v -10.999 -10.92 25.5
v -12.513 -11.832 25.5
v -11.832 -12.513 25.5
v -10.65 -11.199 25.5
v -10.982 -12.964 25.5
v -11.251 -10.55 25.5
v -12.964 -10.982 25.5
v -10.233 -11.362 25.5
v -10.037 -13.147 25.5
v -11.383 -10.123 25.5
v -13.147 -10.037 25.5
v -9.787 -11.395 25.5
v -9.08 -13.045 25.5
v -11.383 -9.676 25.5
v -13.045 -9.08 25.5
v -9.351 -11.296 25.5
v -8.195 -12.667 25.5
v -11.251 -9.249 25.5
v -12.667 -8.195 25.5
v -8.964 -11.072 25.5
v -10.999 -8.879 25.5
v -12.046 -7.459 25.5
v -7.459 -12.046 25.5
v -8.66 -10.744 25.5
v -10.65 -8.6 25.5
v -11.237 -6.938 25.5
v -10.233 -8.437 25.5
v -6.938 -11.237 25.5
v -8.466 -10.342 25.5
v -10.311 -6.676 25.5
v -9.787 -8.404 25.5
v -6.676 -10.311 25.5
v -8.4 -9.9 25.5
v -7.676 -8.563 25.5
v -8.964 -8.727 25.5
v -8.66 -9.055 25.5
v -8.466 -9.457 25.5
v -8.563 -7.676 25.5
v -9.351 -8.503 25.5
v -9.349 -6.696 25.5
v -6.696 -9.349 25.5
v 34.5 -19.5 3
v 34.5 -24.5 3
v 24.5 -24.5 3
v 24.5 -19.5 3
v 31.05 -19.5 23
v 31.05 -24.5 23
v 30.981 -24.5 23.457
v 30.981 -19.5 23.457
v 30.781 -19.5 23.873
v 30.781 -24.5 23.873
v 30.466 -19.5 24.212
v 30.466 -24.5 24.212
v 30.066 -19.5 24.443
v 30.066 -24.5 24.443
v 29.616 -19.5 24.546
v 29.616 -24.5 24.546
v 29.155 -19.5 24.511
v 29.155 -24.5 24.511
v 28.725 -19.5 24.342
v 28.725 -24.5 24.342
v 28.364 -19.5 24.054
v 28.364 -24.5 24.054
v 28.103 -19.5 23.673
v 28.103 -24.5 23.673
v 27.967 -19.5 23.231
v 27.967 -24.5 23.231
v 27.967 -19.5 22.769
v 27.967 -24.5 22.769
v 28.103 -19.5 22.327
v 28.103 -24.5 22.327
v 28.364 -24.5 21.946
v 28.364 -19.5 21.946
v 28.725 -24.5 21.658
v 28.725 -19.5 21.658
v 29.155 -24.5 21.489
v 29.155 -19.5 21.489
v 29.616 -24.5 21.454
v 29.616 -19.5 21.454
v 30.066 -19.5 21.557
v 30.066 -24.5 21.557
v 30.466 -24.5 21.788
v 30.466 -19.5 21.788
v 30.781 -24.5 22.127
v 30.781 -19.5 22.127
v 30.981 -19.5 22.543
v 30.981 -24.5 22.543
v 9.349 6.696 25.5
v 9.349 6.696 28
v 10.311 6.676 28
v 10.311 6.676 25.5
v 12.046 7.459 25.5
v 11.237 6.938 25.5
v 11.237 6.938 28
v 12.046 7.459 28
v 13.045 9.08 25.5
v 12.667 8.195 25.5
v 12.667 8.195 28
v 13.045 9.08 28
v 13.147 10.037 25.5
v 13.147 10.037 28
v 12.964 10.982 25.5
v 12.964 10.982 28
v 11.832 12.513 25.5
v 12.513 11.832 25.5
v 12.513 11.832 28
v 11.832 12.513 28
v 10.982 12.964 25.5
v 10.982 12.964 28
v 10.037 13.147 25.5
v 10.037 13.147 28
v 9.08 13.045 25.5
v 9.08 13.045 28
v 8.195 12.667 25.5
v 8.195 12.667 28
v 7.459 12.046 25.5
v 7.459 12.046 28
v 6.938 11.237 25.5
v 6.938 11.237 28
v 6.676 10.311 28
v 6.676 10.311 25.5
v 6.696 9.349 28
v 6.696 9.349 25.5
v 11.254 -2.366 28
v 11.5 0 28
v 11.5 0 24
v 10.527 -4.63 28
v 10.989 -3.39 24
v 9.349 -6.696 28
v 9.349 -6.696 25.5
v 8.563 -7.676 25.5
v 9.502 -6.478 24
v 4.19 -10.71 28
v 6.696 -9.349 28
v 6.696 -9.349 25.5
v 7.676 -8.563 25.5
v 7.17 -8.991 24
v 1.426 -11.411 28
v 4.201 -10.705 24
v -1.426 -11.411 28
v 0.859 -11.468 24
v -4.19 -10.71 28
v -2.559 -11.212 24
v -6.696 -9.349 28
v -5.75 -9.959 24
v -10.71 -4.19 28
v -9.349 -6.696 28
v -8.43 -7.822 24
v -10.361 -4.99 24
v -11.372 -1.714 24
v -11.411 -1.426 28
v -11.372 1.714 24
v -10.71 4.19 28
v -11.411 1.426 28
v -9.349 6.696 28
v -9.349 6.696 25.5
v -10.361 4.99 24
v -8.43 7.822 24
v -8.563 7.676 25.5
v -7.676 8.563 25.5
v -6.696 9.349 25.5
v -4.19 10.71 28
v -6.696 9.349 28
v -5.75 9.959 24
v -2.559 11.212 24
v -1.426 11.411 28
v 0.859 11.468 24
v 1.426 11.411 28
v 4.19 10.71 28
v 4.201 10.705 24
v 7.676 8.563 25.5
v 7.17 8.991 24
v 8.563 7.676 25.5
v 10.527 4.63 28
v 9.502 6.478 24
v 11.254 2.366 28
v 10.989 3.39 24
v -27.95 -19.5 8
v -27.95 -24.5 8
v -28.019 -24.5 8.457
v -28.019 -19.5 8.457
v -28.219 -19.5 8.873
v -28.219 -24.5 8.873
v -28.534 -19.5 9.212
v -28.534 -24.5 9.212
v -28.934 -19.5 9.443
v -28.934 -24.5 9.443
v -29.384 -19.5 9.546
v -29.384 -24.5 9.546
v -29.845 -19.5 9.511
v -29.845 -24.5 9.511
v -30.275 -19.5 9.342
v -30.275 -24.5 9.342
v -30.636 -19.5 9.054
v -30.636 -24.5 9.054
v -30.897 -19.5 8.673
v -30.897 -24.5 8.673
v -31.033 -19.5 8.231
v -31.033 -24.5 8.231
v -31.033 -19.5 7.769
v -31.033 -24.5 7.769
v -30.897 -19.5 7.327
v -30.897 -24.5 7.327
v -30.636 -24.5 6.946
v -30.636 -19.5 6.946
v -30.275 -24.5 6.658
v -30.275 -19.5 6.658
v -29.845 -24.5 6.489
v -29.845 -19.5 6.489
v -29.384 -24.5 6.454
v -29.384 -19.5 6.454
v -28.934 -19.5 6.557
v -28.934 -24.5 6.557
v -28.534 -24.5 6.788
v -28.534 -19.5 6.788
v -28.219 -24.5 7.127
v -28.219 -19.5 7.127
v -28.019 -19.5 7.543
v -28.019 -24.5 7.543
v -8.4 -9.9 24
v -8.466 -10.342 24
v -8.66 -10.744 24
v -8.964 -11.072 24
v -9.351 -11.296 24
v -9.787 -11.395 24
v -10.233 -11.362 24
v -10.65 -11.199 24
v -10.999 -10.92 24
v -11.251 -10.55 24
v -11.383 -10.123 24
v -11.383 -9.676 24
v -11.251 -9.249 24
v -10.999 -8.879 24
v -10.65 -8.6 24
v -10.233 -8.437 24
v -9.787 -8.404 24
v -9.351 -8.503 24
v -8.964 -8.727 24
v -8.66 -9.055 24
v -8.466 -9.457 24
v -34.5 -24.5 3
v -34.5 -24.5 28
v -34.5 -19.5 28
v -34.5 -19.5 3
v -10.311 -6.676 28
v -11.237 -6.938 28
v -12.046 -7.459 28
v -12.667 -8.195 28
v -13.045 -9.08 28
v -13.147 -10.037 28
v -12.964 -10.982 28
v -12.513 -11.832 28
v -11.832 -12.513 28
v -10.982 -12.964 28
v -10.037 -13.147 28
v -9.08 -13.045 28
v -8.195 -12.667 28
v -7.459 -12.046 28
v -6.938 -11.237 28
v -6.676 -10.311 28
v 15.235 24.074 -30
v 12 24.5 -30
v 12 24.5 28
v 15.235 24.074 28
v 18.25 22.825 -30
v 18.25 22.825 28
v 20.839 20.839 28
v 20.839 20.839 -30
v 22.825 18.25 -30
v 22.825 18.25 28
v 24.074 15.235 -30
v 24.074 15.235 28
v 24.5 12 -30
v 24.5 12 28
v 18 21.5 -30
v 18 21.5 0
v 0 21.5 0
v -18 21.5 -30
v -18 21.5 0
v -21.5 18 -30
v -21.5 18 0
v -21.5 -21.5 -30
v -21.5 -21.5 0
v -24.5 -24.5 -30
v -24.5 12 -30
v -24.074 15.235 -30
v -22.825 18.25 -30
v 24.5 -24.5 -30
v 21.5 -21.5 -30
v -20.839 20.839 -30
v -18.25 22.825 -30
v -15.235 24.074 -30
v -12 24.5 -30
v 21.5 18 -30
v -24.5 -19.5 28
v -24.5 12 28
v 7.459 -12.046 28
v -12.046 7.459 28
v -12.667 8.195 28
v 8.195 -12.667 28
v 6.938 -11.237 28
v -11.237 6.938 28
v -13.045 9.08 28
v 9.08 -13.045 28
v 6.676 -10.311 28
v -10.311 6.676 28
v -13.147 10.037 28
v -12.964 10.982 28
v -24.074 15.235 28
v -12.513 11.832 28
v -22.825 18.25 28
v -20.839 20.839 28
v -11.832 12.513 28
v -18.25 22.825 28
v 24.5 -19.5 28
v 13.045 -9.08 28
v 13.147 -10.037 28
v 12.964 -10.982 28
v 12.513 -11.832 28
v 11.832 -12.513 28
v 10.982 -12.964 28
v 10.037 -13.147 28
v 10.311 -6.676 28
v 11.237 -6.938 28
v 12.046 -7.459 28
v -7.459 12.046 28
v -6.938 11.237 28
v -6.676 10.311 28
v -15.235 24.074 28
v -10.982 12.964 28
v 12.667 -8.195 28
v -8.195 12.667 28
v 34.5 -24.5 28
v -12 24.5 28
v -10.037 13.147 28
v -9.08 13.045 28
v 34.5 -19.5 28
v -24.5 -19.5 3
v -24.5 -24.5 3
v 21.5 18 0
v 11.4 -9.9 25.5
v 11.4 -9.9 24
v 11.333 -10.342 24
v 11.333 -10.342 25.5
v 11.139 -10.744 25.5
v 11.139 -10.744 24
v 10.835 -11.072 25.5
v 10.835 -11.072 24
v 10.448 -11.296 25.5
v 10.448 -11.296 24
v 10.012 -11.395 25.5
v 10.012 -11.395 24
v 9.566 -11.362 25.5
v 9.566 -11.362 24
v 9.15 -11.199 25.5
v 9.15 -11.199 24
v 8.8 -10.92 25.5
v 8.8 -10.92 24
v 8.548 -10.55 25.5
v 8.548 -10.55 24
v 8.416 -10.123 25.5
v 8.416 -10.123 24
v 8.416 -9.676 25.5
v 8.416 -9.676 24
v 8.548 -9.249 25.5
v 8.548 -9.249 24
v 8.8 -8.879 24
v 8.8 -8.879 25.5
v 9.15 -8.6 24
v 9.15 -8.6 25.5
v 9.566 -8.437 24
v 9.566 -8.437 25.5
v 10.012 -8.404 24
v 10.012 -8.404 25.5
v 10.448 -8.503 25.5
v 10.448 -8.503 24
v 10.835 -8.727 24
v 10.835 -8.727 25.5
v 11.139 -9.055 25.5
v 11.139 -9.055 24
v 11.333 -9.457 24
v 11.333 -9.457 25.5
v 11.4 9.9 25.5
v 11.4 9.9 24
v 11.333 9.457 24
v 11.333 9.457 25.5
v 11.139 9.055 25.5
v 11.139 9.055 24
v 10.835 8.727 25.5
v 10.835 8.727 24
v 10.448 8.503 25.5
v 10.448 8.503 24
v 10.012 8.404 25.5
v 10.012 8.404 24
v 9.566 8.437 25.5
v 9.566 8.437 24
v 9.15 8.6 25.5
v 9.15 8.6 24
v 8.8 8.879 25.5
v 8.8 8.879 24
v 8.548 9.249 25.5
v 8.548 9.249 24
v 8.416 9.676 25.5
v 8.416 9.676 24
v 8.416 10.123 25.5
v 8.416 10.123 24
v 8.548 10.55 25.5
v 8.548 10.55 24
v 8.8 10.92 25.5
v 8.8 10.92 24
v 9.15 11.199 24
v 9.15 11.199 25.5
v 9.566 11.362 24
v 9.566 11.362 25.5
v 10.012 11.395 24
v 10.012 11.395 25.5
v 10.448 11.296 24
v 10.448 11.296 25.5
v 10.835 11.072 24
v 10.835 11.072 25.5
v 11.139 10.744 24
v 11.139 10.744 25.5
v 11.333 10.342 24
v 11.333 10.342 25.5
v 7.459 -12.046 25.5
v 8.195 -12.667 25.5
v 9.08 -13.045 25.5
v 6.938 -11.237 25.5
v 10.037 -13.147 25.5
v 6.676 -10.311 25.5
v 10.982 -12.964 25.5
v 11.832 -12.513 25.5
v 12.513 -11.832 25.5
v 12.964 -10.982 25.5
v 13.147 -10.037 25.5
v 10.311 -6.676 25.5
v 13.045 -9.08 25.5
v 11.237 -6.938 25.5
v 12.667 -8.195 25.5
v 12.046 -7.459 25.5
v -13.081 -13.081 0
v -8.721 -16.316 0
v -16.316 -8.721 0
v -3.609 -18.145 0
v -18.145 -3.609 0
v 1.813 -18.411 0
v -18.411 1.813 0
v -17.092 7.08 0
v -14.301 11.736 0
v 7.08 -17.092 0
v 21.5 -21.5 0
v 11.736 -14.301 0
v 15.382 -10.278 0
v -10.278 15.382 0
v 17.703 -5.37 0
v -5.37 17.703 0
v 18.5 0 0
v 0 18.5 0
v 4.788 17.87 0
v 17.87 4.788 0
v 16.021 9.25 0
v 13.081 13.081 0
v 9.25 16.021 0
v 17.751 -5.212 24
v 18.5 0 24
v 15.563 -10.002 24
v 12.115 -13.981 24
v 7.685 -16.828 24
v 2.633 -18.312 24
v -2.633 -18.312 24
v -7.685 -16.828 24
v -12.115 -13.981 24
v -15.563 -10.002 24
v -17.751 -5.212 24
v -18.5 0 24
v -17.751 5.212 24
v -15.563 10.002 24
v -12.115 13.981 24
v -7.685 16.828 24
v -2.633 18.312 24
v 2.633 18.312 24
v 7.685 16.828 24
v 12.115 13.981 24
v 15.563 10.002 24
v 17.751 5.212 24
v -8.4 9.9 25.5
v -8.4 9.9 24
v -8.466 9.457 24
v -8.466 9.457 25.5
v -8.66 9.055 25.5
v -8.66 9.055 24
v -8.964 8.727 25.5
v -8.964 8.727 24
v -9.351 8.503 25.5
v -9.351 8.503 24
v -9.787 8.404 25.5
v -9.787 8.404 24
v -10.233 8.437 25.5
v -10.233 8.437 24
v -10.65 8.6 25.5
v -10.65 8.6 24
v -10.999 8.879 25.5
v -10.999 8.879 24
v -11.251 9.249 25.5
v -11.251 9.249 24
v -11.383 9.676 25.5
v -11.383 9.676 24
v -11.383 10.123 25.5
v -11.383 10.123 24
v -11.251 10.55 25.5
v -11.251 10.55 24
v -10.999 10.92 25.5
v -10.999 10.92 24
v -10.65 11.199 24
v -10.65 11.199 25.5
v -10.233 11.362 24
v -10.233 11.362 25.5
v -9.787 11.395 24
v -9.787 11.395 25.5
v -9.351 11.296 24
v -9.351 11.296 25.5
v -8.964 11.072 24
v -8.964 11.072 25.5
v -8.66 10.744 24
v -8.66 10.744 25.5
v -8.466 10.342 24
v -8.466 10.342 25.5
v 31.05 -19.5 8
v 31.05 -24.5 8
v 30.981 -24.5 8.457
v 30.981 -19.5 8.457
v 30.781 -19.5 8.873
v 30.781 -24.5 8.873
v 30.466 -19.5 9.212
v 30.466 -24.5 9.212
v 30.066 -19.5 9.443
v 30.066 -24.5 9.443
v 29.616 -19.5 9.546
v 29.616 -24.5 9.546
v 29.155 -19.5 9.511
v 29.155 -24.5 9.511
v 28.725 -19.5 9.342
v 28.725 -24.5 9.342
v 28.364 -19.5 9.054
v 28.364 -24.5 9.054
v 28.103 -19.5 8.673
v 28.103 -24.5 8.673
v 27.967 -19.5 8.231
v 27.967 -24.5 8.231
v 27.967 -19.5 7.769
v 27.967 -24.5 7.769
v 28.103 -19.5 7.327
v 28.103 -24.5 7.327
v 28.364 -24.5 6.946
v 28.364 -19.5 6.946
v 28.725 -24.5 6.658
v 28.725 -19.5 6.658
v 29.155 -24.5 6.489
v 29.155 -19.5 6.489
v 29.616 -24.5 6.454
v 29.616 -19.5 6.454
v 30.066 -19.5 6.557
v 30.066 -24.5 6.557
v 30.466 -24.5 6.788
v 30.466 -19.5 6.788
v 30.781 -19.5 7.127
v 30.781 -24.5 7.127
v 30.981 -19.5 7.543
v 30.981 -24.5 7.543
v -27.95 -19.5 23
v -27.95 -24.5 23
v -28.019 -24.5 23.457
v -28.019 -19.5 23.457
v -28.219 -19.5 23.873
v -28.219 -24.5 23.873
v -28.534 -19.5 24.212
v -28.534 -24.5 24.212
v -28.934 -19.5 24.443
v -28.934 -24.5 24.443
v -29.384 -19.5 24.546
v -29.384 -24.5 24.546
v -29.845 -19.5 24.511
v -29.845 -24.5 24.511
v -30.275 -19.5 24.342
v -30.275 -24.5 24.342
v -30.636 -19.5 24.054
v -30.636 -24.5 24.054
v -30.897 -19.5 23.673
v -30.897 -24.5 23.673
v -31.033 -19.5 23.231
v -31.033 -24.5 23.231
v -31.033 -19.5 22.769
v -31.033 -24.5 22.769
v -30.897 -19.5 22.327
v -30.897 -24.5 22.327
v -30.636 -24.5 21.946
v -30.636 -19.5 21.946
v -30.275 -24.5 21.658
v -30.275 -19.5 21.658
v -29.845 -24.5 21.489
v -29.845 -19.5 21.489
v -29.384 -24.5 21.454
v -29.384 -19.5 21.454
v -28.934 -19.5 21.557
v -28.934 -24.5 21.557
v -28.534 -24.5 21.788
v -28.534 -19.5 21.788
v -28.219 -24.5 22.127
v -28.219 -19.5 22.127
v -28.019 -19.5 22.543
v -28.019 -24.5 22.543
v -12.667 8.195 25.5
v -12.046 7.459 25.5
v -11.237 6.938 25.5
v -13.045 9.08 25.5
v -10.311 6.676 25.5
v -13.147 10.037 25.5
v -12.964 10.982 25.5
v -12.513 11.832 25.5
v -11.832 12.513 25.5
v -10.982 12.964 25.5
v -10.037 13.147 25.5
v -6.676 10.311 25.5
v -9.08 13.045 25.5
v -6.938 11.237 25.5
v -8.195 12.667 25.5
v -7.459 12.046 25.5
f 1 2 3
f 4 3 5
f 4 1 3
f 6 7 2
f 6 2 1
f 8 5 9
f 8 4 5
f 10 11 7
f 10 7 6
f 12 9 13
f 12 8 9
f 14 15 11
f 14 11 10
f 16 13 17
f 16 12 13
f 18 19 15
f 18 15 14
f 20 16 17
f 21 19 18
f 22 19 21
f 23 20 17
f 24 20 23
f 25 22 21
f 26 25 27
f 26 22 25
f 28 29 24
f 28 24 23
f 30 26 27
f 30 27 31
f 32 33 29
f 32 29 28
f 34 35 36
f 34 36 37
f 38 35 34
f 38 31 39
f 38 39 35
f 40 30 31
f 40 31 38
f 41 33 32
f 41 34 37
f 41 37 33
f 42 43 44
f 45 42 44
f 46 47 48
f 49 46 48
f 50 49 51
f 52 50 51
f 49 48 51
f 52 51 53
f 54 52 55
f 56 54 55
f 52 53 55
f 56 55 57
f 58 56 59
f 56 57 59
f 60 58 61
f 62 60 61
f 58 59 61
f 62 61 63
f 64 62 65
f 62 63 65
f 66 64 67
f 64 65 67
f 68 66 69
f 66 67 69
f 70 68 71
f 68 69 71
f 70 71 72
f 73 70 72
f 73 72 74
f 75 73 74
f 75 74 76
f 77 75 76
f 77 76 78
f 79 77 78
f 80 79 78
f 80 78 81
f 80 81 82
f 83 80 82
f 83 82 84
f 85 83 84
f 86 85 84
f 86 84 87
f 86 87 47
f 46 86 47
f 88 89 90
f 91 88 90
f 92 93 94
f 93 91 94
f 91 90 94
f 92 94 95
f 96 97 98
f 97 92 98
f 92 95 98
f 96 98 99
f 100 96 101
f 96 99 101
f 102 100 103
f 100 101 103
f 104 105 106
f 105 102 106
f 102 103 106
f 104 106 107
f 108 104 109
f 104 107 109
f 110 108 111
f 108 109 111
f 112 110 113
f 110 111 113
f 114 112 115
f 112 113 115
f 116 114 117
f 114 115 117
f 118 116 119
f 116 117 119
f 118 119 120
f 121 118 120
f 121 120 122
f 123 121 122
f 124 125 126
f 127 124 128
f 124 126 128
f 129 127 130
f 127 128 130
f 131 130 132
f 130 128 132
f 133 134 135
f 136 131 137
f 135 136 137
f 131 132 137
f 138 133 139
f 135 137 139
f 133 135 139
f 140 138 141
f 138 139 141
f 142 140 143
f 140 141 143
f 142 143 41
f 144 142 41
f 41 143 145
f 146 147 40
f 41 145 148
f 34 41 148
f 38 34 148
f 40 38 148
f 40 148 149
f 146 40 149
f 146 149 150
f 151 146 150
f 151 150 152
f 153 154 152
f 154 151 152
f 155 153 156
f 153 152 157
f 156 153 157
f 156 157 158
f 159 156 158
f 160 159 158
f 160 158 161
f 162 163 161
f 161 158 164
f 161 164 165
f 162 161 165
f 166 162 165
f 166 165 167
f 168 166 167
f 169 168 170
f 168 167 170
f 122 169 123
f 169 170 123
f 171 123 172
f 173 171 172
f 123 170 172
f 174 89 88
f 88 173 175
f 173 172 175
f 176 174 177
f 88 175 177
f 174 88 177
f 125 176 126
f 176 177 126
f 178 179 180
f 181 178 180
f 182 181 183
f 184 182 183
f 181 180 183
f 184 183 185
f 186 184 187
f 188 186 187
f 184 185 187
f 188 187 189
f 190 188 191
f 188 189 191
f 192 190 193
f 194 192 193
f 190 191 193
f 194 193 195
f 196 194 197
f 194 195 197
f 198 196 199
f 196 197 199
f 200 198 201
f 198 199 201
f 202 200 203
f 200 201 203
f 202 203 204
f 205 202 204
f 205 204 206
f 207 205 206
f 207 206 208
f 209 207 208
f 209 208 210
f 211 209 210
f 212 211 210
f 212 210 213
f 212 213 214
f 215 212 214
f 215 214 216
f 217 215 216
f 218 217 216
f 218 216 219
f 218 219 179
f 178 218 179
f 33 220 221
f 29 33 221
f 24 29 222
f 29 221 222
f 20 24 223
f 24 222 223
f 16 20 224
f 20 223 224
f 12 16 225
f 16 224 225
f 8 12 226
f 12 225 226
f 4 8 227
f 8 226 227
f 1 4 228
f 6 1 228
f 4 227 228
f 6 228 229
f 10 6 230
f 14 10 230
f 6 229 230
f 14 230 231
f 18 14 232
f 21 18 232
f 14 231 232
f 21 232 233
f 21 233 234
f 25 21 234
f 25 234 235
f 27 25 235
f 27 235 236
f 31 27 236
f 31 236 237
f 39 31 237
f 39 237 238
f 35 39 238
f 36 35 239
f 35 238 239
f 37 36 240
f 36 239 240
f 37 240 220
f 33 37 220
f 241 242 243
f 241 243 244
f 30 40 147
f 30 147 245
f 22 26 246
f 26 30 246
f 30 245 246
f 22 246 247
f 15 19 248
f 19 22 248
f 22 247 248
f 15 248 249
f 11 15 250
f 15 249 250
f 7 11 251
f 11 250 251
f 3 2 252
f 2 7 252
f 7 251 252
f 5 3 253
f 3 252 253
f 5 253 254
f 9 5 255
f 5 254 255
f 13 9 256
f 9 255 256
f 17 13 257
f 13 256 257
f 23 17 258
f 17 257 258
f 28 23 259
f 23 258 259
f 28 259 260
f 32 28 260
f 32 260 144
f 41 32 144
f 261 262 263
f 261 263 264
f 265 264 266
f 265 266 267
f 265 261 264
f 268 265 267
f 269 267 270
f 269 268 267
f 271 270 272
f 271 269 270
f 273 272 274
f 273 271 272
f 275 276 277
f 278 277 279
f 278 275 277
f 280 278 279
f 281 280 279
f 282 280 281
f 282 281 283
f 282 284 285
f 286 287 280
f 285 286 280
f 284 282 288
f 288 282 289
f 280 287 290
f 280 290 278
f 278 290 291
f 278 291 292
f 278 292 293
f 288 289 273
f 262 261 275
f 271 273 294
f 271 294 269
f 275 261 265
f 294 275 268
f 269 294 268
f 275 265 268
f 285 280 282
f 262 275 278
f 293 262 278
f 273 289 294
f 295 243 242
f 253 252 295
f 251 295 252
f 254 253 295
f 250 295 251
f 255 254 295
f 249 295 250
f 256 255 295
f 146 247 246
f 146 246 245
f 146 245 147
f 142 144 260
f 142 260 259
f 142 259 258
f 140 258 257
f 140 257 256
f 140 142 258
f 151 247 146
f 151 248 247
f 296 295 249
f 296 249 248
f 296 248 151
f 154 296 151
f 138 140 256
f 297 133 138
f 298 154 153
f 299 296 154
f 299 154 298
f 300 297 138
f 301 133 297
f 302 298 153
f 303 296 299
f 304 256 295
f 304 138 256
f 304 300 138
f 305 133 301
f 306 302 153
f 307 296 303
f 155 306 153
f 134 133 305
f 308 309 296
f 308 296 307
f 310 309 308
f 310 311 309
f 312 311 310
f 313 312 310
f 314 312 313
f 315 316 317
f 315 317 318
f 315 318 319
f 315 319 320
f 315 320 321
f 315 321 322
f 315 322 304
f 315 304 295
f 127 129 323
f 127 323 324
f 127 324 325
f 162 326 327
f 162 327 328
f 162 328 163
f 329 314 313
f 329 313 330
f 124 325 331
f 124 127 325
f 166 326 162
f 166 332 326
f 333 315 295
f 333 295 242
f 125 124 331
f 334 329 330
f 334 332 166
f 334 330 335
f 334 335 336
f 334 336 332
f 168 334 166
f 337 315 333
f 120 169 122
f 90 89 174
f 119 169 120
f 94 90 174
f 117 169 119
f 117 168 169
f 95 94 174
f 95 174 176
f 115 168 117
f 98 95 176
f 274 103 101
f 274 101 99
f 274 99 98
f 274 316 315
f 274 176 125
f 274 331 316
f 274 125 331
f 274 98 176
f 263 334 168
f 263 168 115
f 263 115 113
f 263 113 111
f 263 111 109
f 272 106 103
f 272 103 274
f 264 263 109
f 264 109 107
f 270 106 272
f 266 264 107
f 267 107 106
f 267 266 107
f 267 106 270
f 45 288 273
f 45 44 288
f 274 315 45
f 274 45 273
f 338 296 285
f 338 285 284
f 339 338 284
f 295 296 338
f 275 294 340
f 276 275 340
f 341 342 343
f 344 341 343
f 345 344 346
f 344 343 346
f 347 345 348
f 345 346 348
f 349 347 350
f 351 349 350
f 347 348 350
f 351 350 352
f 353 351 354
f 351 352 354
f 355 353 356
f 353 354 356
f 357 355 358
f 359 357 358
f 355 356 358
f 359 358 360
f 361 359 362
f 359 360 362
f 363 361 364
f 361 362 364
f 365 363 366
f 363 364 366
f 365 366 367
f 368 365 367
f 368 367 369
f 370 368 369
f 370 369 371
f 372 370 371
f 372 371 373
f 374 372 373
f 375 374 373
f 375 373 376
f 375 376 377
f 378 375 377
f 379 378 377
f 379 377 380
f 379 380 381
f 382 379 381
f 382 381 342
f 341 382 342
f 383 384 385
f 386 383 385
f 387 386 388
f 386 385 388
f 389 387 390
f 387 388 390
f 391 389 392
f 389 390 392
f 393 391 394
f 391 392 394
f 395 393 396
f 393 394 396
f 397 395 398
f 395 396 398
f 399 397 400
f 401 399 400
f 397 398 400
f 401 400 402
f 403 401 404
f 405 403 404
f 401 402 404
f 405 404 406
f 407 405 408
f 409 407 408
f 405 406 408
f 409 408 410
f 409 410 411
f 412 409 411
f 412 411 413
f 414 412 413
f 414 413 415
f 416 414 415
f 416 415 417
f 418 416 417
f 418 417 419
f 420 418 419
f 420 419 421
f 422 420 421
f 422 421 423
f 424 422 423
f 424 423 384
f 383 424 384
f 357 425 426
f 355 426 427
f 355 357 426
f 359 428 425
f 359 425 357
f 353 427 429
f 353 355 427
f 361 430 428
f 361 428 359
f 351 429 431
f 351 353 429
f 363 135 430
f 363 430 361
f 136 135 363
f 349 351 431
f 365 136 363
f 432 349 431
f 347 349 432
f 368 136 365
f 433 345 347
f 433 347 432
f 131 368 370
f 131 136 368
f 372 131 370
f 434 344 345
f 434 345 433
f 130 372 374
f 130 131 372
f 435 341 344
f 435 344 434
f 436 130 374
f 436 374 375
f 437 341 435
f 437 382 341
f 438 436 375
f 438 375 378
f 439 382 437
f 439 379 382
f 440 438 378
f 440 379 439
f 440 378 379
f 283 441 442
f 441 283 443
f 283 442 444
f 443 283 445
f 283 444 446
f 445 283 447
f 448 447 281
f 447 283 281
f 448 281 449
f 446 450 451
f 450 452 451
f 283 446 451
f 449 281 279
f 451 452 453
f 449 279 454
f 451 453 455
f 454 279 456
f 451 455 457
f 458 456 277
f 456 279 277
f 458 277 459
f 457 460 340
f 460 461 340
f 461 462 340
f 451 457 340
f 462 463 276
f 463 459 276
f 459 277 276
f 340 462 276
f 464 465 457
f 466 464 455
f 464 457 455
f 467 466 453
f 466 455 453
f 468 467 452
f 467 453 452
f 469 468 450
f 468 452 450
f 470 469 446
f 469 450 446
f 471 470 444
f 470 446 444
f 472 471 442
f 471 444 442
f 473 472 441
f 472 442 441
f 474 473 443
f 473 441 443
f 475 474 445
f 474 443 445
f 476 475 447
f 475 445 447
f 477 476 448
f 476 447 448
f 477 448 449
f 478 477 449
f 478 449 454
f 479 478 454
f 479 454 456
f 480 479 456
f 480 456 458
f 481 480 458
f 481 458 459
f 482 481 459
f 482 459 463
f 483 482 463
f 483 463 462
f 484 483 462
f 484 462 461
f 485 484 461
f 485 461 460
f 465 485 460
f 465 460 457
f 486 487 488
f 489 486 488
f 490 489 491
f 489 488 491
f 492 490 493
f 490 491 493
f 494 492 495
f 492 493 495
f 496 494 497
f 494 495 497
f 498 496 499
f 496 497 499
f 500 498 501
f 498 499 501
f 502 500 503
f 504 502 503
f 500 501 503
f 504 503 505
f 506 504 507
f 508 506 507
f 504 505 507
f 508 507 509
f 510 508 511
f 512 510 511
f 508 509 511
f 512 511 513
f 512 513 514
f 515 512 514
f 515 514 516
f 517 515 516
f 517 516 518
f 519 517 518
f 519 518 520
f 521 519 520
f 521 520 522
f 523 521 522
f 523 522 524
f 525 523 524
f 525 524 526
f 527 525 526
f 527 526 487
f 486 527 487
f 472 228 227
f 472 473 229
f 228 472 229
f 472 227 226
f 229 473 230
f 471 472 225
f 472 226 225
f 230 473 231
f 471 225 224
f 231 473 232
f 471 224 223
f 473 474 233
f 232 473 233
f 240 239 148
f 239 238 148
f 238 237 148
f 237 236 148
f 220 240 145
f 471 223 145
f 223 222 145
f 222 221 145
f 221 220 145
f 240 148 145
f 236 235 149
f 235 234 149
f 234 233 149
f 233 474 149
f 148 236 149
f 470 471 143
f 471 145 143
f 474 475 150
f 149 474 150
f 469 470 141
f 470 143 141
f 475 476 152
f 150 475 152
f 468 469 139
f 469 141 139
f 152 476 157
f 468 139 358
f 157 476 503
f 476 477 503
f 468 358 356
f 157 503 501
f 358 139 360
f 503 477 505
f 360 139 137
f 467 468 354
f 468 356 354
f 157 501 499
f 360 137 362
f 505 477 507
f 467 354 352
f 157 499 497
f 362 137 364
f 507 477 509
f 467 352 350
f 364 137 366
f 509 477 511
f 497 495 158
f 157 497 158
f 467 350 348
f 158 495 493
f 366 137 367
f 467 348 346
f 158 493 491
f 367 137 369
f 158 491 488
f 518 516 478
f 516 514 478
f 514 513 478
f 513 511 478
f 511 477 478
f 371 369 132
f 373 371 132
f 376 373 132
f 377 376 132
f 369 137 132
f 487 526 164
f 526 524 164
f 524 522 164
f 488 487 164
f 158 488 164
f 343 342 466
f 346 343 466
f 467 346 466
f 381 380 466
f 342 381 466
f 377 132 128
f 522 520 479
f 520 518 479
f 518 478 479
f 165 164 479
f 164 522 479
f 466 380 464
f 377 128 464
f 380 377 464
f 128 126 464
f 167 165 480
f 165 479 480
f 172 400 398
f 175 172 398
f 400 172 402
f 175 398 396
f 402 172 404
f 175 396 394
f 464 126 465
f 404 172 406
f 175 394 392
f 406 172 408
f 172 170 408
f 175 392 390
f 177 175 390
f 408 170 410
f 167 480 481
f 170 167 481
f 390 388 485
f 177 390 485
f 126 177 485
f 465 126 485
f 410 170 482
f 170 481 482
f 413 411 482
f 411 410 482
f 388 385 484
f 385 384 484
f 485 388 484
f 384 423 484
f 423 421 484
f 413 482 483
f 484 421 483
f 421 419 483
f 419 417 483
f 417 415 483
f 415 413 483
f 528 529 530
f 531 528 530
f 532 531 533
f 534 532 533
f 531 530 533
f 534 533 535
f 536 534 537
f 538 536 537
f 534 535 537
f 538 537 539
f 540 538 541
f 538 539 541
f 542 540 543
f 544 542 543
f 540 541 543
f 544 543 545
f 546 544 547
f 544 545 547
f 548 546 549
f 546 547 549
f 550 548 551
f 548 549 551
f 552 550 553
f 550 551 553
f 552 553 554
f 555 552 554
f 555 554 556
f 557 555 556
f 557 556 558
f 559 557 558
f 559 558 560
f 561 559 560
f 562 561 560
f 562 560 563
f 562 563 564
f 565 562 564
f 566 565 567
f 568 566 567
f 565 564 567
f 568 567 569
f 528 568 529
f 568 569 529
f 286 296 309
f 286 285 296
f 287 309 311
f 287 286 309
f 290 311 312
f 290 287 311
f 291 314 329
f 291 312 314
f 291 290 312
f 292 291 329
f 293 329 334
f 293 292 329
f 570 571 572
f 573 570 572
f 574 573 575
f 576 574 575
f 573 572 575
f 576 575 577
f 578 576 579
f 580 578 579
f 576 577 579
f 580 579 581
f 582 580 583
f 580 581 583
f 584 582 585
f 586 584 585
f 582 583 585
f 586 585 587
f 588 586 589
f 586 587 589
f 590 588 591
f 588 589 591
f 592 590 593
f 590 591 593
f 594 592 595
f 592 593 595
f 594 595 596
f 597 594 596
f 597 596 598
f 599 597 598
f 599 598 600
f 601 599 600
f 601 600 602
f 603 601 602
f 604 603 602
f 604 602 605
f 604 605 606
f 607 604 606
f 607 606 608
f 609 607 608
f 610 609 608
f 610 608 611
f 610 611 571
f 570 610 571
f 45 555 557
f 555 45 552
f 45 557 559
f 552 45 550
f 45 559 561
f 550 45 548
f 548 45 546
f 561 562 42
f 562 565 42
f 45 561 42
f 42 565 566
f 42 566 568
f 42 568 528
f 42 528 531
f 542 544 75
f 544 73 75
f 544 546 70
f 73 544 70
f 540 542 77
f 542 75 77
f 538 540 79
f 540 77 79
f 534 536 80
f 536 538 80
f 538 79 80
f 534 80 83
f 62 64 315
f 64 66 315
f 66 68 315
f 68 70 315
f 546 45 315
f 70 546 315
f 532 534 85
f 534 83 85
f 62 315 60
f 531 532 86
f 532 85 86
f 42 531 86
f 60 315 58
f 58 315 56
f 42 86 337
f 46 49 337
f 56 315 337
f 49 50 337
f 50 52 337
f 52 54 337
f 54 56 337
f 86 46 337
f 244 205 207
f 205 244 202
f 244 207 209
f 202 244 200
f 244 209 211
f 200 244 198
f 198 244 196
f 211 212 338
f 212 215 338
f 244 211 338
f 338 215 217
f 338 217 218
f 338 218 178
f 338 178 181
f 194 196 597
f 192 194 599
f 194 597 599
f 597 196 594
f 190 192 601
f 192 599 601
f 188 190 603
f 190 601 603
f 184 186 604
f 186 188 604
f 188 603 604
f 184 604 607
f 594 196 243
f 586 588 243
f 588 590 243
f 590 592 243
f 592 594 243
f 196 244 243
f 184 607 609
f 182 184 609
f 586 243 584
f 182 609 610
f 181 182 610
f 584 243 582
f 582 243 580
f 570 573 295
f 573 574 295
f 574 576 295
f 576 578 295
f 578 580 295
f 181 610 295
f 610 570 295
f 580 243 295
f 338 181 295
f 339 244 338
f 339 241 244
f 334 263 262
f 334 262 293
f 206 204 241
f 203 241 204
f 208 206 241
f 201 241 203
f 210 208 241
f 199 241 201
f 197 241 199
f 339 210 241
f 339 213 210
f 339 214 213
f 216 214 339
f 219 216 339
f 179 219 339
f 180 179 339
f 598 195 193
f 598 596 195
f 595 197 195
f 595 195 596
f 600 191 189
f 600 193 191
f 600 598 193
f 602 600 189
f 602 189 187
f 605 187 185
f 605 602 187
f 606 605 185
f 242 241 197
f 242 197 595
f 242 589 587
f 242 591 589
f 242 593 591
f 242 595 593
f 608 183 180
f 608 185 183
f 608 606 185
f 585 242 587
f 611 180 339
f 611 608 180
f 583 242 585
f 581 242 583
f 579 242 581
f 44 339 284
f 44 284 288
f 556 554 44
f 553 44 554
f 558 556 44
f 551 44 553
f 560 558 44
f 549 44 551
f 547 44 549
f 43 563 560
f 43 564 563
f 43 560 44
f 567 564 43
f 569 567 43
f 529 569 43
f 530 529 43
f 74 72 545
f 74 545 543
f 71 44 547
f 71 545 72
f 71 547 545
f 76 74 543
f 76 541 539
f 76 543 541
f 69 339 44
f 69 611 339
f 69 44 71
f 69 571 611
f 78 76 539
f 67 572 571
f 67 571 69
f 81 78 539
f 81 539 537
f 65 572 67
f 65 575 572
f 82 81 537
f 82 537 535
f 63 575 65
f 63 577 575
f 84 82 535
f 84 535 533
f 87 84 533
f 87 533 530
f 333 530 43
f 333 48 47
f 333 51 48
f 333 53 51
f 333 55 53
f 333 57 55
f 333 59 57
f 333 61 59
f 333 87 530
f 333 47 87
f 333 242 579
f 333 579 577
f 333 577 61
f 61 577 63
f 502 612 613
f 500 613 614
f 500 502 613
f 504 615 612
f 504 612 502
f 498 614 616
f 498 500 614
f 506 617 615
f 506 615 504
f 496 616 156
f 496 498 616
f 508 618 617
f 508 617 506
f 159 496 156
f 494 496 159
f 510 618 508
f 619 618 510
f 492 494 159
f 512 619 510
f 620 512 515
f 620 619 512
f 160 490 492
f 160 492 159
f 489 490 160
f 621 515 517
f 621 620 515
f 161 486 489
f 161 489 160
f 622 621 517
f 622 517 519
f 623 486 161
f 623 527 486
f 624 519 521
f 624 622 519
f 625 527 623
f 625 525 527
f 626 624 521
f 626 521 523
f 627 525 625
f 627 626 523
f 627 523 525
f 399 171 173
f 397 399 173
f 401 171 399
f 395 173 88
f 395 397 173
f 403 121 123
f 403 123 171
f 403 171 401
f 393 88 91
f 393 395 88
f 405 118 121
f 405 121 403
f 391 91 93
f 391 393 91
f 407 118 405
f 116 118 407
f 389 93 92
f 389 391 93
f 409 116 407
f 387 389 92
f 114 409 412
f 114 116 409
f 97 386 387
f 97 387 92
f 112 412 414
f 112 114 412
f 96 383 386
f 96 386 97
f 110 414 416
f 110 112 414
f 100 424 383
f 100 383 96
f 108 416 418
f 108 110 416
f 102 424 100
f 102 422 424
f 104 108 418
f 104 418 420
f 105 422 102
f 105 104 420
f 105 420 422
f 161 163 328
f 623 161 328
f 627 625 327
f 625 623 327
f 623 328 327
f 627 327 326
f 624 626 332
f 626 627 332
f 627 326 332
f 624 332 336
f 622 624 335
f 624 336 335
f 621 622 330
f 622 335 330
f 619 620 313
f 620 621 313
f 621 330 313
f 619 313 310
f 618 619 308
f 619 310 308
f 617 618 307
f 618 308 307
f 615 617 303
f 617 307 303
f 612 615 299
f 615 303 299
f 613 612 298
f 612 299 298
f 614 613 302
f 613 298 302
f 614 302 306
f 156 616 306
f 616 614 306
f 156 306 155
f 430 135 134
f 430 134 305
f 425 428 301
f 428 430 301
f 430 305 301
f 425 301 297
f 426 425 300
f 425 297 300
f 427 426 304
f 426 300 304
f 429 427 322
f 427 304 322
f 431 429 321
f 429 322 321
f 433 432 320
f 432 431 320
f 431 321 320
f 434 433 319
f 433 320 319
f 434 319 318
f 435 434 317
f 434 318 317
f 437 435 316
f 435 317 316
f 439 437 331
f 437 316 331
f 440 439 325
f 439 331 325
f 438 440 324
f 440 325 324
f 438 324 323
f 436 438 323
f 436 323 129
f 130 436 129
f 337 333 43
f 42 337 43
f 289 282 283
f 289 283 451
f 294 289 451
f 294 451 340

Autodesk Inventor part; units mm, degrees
ref_plane "YZ Plane" through (0, 0, 0) normal (1, 0, 0) x (0, 1, 0)
ref_plane "XZ Plane" through (0, 0, 0) normal (0, 1, 0) x (-1, 0, 0)
ref_plane "XY Plane" through (0, 0, 0) normal (0, 0, 1) x (1, 0, 0)
sketch "Sketch1" plane through (0, 0, 0) normal (0, 0, 1) x (1, 0, 0)
  line L0 (-21.5, -21.5) -> (21.5, -21.5)
  line L1 (21.5, -21.5) -> (21.5, 21.5)
  line L2 (21.5, 21.5) -> (-21.5, 21.5)
  line L3 (-21.5, 21.5) -> (-21.5, -21.5)
  line L4 (-21.5, -21.5) -> (21.5, 21.5) construction
  line L5 (21.5, -21.5) -> (-21.5, 21.5) construction
  circle A0 centre (0, 0) radius 18.5
  circle A1 centre (0, 0) radius 11.5
  circle A2 centre (0, 0) radius 14
  circle A3 centre (-9.8995, 9.8995) radius 1.5
  circle A4 centre (-9.8995, -9.8995) radius 1.5
  circle A5 centre (9.8995, -9.8995) radius 1.5
  circle A6 centre (9.8995, 9.8995) radius 1.5
  line L6 (0, 0) -> (0, 21.5)
  line L7 (-24.5, 24.5) -> (24.5, 24.5)
  line L8 (24.5, 24.5) -> (24.5, -24.5)
  line L9 (24.5, -24.5) -> (-24.5, -24.5)
  line L10 (-24.5, -24.5) -> (-24.5, 24.5)
  line L11 (-24.5, 24.5) -> (24.5, -24.5) construction
  line L12 (24.5, 24.5) -> (-24.5, -24.5) construction
  dimension "d4" = 28
  dimension "d0" = 43
  dimension "d1" = 43
  dimension "d2" = 37
  dimension "d3" = 23
  dimension "d5" = 3
  dimension "d8" = 360
  dimension "d10" = 3
  dimension "d11" = 3
extrude "Extrusion1" add sketch "Sketch1" along normal blind 5 and the other way blind 30 contours L7 L8 L9 L10
extrude "Extrusion2" add sketch "Sketch1" along normal blind 24 contours L3 L2 L1 L0
sketch "Sketch2" plane through (0, 0, 24) normal (0, 0, 1) x (1, 0, 0)
  circle A0 centre (0, 0) radius 11.5 projected
  circle A1 centre (0, 0) radius 14 projected
  circle A2 centre (9.8995, 9.8995) radius 1.5 projected
  circle A3 centre (9.8995, -9.8995) radius 1.5 projected
  circle A4 centre (-9.8995, -9.8995) radius 1.5 projected
  circle A5 centre (-9.8995, 9.8995) radius 1.5 projected
  circle A6 centre (0, 0) radius 18.5 projected
  line L0 (-21.5, 21.5) -> (-21.5, -21.5) projected
  line L1 (-21.5, -21.5) -> (21.5, -21.5) projected
  line L2 (21.5, -21.5) -> (21.5, 21.5) projected
  line L3 (21.5, 21.5) -> (-21.5, 21.5) projected
  circle A7 centre (0, 0) radius 18.5 projected
  line L4 (24.5, -24.5) -> (-24.5, -24.5) projected
  line L5 (24.5, 24.5) -> (24.5, -24.5) projected
  line L6 (-24.5, 24.5) -> (24.5, 24.5) projected
  line L7 (-24.5, -24.5) -> (-24.5, 24.5) projected
  line L8 (21.5, -21.5) -> (21.5, 21.5) projected
  line L9 (-21.5, -21.5) -> (21.5, -21.5) projected
  line L10 (-21.5, 21.5) -> (-21.5, -21.5) projected
  line L11 (21.5, 21.5) -> (-21.5, 21.5) projected
extrude "Extrusion3" add sketch "Sketch2" along normal blind 4 contours A1 A3 A4 A5 A2 | A6 | L3 L2 L1 L0
sketch "Sketch8" plane through (0, 0, 28) normal (0, 0, 1) x (1, 0, 0)
  line L0 (-24.5, -24.5) -> (24.5, -24.5) projected
  line L1 (24.5, -24.5) -> (24.5, 24.5) projected
  line L2 (24.5, 24.5) -> (-24.5, 24.5) projected
  line L3 (-24.5, 24.5) -> (-24.5, -24.5) projected
  line L4 (21.5, 21.5) -> (21.5, -21.5) projected
  line L5 (21.5, -21.5) -> (-21.5, -21.5) projected
  line L6 (-21.5, -21.5) -> (-21.5, 21.5) projected
  line L7 (-21.5, 21.5) -> (21.5, 21.5) projected
  line L8 (-21.5, 21.5) -> (-21.5, -21.5) projected
  line L9 (-21.5, -21.5) -> (21.5, -21.5) projected
  line L10 (21.5, -21.5) -> (21.5, 21.5) projected
  line L11 (21.5, 21.5) -> (-21.5, 21.5) projected
  circle A0 centre (-9.8995, 9.8995) radius 1.5 projected
  circle A1 centre (-9.8995, -9.8995) radius 1.5 projected
  circle A2 centre (9.8995, -9.8995) radius 1.5 projected
  circle A3 centre (0, 0) radius 11.5 projected
  circle A4 centre (9.8995, 9.8995) radius 1.5 projected
extrude "Extrusion8" add sketch "Sketch8" against normal up to surface (23 mm away) contours L3 L2 L1 L0
sketch "Sketch9" plane through (-24.5, -24.5, -30) normal (0, -1, 0) x (1, 0, 0)
  line L0 (49, 0) -> (49, 58) projected
  line L1 (49, 58) -> (59, 58)
  line L2 (59, 58) -> (59, 33)
  line L3 (59, 33) -> (49, 33)
  line L4 (49, 33) -> (49, 58)
  line L5 (0, 58) -> (0, 0) projected
  line L6 (0, 58) -> (-10, 58)
  line L7 (-10, 58) -> (-10, 33)
  line L8 (-10, 33) -> (0, 33)
  line L9 (0, 33) -> (0, 58)
  line L10 (0, 58) -> (49, 58) projected
  circle A0 centre (54, 38) radius 1.55
  circle A1 centre (54, 53) radius 1.55
  circle A2 centre (-5, 38) radius 1.55
  circle A3 centre (-5, 53) radius 1.55
  point P0 (24.5, 30)
  point P1 (0, 33)
  point P2 (49, 33)
  dimension "d72" = 0
  dimension "d73" = 25
  dimension "d74" = 25
  dimension "d75" = 10
  dimension "d76" = 10
  dimension "d77" = 15
  dimension "d78" = 15
  dimension "d79" = 5
  dimension "d80" = 5
  dimension "d81" = 3.1
  dimension "d82" = 3.1
  dimension "d83" = 3.1
  dimension "d84" = 3.1
extrude "Extrusion9" add sketch "Sketch9" against normal blind 5
chamfer "Chamfer3" distance 3.5 angle 45 2 edges at (21.5, 21.5, -15) (-21.5, 21.5, -15)
fillet "Fillet10" radius 12.5 2 edges at (-24.5, 24.5, -1) (24.5, 24.5, -1)
sketch "Sketch10" plane through (0, 0, 28) normal (0, 0, 1) x (1, 0, 0)
  circle A0 centre (-9.8995, 9.8995) radius 1.5 projected
  circle A1 centre (-9.8995, 9.8995) radius 3.25
  circle A2 centre (9.8995, 9.8995) radius 1.5 projected
  circle A3 centre (9.8995, 9.8995) radius 3.25
  circle A4 centre (9.8995, -9.8995) radius 1.5 projected
  circle A5 centre (9.8995, -9.8995) radius 3.25
  circle A6 centre (-9.8995, -9.8995) radius 1.5 projected
  circle A7 centre (-9.8995, -9.8995) radius 3.25
  point P0 (0, 0)
  dimension "d94" = 6.5
  dimension "d95" = 6.5
  dimension "d96" = 6.5
  dimension "d97" = 6.5
extrude "Extrusion10" cut sketch "Sketch10" against normal blind 2.5 contours A0 | A1 | A2 | A3 | A4 | A5 | A6 | A7
properties part number "StepperMotorHolder"
